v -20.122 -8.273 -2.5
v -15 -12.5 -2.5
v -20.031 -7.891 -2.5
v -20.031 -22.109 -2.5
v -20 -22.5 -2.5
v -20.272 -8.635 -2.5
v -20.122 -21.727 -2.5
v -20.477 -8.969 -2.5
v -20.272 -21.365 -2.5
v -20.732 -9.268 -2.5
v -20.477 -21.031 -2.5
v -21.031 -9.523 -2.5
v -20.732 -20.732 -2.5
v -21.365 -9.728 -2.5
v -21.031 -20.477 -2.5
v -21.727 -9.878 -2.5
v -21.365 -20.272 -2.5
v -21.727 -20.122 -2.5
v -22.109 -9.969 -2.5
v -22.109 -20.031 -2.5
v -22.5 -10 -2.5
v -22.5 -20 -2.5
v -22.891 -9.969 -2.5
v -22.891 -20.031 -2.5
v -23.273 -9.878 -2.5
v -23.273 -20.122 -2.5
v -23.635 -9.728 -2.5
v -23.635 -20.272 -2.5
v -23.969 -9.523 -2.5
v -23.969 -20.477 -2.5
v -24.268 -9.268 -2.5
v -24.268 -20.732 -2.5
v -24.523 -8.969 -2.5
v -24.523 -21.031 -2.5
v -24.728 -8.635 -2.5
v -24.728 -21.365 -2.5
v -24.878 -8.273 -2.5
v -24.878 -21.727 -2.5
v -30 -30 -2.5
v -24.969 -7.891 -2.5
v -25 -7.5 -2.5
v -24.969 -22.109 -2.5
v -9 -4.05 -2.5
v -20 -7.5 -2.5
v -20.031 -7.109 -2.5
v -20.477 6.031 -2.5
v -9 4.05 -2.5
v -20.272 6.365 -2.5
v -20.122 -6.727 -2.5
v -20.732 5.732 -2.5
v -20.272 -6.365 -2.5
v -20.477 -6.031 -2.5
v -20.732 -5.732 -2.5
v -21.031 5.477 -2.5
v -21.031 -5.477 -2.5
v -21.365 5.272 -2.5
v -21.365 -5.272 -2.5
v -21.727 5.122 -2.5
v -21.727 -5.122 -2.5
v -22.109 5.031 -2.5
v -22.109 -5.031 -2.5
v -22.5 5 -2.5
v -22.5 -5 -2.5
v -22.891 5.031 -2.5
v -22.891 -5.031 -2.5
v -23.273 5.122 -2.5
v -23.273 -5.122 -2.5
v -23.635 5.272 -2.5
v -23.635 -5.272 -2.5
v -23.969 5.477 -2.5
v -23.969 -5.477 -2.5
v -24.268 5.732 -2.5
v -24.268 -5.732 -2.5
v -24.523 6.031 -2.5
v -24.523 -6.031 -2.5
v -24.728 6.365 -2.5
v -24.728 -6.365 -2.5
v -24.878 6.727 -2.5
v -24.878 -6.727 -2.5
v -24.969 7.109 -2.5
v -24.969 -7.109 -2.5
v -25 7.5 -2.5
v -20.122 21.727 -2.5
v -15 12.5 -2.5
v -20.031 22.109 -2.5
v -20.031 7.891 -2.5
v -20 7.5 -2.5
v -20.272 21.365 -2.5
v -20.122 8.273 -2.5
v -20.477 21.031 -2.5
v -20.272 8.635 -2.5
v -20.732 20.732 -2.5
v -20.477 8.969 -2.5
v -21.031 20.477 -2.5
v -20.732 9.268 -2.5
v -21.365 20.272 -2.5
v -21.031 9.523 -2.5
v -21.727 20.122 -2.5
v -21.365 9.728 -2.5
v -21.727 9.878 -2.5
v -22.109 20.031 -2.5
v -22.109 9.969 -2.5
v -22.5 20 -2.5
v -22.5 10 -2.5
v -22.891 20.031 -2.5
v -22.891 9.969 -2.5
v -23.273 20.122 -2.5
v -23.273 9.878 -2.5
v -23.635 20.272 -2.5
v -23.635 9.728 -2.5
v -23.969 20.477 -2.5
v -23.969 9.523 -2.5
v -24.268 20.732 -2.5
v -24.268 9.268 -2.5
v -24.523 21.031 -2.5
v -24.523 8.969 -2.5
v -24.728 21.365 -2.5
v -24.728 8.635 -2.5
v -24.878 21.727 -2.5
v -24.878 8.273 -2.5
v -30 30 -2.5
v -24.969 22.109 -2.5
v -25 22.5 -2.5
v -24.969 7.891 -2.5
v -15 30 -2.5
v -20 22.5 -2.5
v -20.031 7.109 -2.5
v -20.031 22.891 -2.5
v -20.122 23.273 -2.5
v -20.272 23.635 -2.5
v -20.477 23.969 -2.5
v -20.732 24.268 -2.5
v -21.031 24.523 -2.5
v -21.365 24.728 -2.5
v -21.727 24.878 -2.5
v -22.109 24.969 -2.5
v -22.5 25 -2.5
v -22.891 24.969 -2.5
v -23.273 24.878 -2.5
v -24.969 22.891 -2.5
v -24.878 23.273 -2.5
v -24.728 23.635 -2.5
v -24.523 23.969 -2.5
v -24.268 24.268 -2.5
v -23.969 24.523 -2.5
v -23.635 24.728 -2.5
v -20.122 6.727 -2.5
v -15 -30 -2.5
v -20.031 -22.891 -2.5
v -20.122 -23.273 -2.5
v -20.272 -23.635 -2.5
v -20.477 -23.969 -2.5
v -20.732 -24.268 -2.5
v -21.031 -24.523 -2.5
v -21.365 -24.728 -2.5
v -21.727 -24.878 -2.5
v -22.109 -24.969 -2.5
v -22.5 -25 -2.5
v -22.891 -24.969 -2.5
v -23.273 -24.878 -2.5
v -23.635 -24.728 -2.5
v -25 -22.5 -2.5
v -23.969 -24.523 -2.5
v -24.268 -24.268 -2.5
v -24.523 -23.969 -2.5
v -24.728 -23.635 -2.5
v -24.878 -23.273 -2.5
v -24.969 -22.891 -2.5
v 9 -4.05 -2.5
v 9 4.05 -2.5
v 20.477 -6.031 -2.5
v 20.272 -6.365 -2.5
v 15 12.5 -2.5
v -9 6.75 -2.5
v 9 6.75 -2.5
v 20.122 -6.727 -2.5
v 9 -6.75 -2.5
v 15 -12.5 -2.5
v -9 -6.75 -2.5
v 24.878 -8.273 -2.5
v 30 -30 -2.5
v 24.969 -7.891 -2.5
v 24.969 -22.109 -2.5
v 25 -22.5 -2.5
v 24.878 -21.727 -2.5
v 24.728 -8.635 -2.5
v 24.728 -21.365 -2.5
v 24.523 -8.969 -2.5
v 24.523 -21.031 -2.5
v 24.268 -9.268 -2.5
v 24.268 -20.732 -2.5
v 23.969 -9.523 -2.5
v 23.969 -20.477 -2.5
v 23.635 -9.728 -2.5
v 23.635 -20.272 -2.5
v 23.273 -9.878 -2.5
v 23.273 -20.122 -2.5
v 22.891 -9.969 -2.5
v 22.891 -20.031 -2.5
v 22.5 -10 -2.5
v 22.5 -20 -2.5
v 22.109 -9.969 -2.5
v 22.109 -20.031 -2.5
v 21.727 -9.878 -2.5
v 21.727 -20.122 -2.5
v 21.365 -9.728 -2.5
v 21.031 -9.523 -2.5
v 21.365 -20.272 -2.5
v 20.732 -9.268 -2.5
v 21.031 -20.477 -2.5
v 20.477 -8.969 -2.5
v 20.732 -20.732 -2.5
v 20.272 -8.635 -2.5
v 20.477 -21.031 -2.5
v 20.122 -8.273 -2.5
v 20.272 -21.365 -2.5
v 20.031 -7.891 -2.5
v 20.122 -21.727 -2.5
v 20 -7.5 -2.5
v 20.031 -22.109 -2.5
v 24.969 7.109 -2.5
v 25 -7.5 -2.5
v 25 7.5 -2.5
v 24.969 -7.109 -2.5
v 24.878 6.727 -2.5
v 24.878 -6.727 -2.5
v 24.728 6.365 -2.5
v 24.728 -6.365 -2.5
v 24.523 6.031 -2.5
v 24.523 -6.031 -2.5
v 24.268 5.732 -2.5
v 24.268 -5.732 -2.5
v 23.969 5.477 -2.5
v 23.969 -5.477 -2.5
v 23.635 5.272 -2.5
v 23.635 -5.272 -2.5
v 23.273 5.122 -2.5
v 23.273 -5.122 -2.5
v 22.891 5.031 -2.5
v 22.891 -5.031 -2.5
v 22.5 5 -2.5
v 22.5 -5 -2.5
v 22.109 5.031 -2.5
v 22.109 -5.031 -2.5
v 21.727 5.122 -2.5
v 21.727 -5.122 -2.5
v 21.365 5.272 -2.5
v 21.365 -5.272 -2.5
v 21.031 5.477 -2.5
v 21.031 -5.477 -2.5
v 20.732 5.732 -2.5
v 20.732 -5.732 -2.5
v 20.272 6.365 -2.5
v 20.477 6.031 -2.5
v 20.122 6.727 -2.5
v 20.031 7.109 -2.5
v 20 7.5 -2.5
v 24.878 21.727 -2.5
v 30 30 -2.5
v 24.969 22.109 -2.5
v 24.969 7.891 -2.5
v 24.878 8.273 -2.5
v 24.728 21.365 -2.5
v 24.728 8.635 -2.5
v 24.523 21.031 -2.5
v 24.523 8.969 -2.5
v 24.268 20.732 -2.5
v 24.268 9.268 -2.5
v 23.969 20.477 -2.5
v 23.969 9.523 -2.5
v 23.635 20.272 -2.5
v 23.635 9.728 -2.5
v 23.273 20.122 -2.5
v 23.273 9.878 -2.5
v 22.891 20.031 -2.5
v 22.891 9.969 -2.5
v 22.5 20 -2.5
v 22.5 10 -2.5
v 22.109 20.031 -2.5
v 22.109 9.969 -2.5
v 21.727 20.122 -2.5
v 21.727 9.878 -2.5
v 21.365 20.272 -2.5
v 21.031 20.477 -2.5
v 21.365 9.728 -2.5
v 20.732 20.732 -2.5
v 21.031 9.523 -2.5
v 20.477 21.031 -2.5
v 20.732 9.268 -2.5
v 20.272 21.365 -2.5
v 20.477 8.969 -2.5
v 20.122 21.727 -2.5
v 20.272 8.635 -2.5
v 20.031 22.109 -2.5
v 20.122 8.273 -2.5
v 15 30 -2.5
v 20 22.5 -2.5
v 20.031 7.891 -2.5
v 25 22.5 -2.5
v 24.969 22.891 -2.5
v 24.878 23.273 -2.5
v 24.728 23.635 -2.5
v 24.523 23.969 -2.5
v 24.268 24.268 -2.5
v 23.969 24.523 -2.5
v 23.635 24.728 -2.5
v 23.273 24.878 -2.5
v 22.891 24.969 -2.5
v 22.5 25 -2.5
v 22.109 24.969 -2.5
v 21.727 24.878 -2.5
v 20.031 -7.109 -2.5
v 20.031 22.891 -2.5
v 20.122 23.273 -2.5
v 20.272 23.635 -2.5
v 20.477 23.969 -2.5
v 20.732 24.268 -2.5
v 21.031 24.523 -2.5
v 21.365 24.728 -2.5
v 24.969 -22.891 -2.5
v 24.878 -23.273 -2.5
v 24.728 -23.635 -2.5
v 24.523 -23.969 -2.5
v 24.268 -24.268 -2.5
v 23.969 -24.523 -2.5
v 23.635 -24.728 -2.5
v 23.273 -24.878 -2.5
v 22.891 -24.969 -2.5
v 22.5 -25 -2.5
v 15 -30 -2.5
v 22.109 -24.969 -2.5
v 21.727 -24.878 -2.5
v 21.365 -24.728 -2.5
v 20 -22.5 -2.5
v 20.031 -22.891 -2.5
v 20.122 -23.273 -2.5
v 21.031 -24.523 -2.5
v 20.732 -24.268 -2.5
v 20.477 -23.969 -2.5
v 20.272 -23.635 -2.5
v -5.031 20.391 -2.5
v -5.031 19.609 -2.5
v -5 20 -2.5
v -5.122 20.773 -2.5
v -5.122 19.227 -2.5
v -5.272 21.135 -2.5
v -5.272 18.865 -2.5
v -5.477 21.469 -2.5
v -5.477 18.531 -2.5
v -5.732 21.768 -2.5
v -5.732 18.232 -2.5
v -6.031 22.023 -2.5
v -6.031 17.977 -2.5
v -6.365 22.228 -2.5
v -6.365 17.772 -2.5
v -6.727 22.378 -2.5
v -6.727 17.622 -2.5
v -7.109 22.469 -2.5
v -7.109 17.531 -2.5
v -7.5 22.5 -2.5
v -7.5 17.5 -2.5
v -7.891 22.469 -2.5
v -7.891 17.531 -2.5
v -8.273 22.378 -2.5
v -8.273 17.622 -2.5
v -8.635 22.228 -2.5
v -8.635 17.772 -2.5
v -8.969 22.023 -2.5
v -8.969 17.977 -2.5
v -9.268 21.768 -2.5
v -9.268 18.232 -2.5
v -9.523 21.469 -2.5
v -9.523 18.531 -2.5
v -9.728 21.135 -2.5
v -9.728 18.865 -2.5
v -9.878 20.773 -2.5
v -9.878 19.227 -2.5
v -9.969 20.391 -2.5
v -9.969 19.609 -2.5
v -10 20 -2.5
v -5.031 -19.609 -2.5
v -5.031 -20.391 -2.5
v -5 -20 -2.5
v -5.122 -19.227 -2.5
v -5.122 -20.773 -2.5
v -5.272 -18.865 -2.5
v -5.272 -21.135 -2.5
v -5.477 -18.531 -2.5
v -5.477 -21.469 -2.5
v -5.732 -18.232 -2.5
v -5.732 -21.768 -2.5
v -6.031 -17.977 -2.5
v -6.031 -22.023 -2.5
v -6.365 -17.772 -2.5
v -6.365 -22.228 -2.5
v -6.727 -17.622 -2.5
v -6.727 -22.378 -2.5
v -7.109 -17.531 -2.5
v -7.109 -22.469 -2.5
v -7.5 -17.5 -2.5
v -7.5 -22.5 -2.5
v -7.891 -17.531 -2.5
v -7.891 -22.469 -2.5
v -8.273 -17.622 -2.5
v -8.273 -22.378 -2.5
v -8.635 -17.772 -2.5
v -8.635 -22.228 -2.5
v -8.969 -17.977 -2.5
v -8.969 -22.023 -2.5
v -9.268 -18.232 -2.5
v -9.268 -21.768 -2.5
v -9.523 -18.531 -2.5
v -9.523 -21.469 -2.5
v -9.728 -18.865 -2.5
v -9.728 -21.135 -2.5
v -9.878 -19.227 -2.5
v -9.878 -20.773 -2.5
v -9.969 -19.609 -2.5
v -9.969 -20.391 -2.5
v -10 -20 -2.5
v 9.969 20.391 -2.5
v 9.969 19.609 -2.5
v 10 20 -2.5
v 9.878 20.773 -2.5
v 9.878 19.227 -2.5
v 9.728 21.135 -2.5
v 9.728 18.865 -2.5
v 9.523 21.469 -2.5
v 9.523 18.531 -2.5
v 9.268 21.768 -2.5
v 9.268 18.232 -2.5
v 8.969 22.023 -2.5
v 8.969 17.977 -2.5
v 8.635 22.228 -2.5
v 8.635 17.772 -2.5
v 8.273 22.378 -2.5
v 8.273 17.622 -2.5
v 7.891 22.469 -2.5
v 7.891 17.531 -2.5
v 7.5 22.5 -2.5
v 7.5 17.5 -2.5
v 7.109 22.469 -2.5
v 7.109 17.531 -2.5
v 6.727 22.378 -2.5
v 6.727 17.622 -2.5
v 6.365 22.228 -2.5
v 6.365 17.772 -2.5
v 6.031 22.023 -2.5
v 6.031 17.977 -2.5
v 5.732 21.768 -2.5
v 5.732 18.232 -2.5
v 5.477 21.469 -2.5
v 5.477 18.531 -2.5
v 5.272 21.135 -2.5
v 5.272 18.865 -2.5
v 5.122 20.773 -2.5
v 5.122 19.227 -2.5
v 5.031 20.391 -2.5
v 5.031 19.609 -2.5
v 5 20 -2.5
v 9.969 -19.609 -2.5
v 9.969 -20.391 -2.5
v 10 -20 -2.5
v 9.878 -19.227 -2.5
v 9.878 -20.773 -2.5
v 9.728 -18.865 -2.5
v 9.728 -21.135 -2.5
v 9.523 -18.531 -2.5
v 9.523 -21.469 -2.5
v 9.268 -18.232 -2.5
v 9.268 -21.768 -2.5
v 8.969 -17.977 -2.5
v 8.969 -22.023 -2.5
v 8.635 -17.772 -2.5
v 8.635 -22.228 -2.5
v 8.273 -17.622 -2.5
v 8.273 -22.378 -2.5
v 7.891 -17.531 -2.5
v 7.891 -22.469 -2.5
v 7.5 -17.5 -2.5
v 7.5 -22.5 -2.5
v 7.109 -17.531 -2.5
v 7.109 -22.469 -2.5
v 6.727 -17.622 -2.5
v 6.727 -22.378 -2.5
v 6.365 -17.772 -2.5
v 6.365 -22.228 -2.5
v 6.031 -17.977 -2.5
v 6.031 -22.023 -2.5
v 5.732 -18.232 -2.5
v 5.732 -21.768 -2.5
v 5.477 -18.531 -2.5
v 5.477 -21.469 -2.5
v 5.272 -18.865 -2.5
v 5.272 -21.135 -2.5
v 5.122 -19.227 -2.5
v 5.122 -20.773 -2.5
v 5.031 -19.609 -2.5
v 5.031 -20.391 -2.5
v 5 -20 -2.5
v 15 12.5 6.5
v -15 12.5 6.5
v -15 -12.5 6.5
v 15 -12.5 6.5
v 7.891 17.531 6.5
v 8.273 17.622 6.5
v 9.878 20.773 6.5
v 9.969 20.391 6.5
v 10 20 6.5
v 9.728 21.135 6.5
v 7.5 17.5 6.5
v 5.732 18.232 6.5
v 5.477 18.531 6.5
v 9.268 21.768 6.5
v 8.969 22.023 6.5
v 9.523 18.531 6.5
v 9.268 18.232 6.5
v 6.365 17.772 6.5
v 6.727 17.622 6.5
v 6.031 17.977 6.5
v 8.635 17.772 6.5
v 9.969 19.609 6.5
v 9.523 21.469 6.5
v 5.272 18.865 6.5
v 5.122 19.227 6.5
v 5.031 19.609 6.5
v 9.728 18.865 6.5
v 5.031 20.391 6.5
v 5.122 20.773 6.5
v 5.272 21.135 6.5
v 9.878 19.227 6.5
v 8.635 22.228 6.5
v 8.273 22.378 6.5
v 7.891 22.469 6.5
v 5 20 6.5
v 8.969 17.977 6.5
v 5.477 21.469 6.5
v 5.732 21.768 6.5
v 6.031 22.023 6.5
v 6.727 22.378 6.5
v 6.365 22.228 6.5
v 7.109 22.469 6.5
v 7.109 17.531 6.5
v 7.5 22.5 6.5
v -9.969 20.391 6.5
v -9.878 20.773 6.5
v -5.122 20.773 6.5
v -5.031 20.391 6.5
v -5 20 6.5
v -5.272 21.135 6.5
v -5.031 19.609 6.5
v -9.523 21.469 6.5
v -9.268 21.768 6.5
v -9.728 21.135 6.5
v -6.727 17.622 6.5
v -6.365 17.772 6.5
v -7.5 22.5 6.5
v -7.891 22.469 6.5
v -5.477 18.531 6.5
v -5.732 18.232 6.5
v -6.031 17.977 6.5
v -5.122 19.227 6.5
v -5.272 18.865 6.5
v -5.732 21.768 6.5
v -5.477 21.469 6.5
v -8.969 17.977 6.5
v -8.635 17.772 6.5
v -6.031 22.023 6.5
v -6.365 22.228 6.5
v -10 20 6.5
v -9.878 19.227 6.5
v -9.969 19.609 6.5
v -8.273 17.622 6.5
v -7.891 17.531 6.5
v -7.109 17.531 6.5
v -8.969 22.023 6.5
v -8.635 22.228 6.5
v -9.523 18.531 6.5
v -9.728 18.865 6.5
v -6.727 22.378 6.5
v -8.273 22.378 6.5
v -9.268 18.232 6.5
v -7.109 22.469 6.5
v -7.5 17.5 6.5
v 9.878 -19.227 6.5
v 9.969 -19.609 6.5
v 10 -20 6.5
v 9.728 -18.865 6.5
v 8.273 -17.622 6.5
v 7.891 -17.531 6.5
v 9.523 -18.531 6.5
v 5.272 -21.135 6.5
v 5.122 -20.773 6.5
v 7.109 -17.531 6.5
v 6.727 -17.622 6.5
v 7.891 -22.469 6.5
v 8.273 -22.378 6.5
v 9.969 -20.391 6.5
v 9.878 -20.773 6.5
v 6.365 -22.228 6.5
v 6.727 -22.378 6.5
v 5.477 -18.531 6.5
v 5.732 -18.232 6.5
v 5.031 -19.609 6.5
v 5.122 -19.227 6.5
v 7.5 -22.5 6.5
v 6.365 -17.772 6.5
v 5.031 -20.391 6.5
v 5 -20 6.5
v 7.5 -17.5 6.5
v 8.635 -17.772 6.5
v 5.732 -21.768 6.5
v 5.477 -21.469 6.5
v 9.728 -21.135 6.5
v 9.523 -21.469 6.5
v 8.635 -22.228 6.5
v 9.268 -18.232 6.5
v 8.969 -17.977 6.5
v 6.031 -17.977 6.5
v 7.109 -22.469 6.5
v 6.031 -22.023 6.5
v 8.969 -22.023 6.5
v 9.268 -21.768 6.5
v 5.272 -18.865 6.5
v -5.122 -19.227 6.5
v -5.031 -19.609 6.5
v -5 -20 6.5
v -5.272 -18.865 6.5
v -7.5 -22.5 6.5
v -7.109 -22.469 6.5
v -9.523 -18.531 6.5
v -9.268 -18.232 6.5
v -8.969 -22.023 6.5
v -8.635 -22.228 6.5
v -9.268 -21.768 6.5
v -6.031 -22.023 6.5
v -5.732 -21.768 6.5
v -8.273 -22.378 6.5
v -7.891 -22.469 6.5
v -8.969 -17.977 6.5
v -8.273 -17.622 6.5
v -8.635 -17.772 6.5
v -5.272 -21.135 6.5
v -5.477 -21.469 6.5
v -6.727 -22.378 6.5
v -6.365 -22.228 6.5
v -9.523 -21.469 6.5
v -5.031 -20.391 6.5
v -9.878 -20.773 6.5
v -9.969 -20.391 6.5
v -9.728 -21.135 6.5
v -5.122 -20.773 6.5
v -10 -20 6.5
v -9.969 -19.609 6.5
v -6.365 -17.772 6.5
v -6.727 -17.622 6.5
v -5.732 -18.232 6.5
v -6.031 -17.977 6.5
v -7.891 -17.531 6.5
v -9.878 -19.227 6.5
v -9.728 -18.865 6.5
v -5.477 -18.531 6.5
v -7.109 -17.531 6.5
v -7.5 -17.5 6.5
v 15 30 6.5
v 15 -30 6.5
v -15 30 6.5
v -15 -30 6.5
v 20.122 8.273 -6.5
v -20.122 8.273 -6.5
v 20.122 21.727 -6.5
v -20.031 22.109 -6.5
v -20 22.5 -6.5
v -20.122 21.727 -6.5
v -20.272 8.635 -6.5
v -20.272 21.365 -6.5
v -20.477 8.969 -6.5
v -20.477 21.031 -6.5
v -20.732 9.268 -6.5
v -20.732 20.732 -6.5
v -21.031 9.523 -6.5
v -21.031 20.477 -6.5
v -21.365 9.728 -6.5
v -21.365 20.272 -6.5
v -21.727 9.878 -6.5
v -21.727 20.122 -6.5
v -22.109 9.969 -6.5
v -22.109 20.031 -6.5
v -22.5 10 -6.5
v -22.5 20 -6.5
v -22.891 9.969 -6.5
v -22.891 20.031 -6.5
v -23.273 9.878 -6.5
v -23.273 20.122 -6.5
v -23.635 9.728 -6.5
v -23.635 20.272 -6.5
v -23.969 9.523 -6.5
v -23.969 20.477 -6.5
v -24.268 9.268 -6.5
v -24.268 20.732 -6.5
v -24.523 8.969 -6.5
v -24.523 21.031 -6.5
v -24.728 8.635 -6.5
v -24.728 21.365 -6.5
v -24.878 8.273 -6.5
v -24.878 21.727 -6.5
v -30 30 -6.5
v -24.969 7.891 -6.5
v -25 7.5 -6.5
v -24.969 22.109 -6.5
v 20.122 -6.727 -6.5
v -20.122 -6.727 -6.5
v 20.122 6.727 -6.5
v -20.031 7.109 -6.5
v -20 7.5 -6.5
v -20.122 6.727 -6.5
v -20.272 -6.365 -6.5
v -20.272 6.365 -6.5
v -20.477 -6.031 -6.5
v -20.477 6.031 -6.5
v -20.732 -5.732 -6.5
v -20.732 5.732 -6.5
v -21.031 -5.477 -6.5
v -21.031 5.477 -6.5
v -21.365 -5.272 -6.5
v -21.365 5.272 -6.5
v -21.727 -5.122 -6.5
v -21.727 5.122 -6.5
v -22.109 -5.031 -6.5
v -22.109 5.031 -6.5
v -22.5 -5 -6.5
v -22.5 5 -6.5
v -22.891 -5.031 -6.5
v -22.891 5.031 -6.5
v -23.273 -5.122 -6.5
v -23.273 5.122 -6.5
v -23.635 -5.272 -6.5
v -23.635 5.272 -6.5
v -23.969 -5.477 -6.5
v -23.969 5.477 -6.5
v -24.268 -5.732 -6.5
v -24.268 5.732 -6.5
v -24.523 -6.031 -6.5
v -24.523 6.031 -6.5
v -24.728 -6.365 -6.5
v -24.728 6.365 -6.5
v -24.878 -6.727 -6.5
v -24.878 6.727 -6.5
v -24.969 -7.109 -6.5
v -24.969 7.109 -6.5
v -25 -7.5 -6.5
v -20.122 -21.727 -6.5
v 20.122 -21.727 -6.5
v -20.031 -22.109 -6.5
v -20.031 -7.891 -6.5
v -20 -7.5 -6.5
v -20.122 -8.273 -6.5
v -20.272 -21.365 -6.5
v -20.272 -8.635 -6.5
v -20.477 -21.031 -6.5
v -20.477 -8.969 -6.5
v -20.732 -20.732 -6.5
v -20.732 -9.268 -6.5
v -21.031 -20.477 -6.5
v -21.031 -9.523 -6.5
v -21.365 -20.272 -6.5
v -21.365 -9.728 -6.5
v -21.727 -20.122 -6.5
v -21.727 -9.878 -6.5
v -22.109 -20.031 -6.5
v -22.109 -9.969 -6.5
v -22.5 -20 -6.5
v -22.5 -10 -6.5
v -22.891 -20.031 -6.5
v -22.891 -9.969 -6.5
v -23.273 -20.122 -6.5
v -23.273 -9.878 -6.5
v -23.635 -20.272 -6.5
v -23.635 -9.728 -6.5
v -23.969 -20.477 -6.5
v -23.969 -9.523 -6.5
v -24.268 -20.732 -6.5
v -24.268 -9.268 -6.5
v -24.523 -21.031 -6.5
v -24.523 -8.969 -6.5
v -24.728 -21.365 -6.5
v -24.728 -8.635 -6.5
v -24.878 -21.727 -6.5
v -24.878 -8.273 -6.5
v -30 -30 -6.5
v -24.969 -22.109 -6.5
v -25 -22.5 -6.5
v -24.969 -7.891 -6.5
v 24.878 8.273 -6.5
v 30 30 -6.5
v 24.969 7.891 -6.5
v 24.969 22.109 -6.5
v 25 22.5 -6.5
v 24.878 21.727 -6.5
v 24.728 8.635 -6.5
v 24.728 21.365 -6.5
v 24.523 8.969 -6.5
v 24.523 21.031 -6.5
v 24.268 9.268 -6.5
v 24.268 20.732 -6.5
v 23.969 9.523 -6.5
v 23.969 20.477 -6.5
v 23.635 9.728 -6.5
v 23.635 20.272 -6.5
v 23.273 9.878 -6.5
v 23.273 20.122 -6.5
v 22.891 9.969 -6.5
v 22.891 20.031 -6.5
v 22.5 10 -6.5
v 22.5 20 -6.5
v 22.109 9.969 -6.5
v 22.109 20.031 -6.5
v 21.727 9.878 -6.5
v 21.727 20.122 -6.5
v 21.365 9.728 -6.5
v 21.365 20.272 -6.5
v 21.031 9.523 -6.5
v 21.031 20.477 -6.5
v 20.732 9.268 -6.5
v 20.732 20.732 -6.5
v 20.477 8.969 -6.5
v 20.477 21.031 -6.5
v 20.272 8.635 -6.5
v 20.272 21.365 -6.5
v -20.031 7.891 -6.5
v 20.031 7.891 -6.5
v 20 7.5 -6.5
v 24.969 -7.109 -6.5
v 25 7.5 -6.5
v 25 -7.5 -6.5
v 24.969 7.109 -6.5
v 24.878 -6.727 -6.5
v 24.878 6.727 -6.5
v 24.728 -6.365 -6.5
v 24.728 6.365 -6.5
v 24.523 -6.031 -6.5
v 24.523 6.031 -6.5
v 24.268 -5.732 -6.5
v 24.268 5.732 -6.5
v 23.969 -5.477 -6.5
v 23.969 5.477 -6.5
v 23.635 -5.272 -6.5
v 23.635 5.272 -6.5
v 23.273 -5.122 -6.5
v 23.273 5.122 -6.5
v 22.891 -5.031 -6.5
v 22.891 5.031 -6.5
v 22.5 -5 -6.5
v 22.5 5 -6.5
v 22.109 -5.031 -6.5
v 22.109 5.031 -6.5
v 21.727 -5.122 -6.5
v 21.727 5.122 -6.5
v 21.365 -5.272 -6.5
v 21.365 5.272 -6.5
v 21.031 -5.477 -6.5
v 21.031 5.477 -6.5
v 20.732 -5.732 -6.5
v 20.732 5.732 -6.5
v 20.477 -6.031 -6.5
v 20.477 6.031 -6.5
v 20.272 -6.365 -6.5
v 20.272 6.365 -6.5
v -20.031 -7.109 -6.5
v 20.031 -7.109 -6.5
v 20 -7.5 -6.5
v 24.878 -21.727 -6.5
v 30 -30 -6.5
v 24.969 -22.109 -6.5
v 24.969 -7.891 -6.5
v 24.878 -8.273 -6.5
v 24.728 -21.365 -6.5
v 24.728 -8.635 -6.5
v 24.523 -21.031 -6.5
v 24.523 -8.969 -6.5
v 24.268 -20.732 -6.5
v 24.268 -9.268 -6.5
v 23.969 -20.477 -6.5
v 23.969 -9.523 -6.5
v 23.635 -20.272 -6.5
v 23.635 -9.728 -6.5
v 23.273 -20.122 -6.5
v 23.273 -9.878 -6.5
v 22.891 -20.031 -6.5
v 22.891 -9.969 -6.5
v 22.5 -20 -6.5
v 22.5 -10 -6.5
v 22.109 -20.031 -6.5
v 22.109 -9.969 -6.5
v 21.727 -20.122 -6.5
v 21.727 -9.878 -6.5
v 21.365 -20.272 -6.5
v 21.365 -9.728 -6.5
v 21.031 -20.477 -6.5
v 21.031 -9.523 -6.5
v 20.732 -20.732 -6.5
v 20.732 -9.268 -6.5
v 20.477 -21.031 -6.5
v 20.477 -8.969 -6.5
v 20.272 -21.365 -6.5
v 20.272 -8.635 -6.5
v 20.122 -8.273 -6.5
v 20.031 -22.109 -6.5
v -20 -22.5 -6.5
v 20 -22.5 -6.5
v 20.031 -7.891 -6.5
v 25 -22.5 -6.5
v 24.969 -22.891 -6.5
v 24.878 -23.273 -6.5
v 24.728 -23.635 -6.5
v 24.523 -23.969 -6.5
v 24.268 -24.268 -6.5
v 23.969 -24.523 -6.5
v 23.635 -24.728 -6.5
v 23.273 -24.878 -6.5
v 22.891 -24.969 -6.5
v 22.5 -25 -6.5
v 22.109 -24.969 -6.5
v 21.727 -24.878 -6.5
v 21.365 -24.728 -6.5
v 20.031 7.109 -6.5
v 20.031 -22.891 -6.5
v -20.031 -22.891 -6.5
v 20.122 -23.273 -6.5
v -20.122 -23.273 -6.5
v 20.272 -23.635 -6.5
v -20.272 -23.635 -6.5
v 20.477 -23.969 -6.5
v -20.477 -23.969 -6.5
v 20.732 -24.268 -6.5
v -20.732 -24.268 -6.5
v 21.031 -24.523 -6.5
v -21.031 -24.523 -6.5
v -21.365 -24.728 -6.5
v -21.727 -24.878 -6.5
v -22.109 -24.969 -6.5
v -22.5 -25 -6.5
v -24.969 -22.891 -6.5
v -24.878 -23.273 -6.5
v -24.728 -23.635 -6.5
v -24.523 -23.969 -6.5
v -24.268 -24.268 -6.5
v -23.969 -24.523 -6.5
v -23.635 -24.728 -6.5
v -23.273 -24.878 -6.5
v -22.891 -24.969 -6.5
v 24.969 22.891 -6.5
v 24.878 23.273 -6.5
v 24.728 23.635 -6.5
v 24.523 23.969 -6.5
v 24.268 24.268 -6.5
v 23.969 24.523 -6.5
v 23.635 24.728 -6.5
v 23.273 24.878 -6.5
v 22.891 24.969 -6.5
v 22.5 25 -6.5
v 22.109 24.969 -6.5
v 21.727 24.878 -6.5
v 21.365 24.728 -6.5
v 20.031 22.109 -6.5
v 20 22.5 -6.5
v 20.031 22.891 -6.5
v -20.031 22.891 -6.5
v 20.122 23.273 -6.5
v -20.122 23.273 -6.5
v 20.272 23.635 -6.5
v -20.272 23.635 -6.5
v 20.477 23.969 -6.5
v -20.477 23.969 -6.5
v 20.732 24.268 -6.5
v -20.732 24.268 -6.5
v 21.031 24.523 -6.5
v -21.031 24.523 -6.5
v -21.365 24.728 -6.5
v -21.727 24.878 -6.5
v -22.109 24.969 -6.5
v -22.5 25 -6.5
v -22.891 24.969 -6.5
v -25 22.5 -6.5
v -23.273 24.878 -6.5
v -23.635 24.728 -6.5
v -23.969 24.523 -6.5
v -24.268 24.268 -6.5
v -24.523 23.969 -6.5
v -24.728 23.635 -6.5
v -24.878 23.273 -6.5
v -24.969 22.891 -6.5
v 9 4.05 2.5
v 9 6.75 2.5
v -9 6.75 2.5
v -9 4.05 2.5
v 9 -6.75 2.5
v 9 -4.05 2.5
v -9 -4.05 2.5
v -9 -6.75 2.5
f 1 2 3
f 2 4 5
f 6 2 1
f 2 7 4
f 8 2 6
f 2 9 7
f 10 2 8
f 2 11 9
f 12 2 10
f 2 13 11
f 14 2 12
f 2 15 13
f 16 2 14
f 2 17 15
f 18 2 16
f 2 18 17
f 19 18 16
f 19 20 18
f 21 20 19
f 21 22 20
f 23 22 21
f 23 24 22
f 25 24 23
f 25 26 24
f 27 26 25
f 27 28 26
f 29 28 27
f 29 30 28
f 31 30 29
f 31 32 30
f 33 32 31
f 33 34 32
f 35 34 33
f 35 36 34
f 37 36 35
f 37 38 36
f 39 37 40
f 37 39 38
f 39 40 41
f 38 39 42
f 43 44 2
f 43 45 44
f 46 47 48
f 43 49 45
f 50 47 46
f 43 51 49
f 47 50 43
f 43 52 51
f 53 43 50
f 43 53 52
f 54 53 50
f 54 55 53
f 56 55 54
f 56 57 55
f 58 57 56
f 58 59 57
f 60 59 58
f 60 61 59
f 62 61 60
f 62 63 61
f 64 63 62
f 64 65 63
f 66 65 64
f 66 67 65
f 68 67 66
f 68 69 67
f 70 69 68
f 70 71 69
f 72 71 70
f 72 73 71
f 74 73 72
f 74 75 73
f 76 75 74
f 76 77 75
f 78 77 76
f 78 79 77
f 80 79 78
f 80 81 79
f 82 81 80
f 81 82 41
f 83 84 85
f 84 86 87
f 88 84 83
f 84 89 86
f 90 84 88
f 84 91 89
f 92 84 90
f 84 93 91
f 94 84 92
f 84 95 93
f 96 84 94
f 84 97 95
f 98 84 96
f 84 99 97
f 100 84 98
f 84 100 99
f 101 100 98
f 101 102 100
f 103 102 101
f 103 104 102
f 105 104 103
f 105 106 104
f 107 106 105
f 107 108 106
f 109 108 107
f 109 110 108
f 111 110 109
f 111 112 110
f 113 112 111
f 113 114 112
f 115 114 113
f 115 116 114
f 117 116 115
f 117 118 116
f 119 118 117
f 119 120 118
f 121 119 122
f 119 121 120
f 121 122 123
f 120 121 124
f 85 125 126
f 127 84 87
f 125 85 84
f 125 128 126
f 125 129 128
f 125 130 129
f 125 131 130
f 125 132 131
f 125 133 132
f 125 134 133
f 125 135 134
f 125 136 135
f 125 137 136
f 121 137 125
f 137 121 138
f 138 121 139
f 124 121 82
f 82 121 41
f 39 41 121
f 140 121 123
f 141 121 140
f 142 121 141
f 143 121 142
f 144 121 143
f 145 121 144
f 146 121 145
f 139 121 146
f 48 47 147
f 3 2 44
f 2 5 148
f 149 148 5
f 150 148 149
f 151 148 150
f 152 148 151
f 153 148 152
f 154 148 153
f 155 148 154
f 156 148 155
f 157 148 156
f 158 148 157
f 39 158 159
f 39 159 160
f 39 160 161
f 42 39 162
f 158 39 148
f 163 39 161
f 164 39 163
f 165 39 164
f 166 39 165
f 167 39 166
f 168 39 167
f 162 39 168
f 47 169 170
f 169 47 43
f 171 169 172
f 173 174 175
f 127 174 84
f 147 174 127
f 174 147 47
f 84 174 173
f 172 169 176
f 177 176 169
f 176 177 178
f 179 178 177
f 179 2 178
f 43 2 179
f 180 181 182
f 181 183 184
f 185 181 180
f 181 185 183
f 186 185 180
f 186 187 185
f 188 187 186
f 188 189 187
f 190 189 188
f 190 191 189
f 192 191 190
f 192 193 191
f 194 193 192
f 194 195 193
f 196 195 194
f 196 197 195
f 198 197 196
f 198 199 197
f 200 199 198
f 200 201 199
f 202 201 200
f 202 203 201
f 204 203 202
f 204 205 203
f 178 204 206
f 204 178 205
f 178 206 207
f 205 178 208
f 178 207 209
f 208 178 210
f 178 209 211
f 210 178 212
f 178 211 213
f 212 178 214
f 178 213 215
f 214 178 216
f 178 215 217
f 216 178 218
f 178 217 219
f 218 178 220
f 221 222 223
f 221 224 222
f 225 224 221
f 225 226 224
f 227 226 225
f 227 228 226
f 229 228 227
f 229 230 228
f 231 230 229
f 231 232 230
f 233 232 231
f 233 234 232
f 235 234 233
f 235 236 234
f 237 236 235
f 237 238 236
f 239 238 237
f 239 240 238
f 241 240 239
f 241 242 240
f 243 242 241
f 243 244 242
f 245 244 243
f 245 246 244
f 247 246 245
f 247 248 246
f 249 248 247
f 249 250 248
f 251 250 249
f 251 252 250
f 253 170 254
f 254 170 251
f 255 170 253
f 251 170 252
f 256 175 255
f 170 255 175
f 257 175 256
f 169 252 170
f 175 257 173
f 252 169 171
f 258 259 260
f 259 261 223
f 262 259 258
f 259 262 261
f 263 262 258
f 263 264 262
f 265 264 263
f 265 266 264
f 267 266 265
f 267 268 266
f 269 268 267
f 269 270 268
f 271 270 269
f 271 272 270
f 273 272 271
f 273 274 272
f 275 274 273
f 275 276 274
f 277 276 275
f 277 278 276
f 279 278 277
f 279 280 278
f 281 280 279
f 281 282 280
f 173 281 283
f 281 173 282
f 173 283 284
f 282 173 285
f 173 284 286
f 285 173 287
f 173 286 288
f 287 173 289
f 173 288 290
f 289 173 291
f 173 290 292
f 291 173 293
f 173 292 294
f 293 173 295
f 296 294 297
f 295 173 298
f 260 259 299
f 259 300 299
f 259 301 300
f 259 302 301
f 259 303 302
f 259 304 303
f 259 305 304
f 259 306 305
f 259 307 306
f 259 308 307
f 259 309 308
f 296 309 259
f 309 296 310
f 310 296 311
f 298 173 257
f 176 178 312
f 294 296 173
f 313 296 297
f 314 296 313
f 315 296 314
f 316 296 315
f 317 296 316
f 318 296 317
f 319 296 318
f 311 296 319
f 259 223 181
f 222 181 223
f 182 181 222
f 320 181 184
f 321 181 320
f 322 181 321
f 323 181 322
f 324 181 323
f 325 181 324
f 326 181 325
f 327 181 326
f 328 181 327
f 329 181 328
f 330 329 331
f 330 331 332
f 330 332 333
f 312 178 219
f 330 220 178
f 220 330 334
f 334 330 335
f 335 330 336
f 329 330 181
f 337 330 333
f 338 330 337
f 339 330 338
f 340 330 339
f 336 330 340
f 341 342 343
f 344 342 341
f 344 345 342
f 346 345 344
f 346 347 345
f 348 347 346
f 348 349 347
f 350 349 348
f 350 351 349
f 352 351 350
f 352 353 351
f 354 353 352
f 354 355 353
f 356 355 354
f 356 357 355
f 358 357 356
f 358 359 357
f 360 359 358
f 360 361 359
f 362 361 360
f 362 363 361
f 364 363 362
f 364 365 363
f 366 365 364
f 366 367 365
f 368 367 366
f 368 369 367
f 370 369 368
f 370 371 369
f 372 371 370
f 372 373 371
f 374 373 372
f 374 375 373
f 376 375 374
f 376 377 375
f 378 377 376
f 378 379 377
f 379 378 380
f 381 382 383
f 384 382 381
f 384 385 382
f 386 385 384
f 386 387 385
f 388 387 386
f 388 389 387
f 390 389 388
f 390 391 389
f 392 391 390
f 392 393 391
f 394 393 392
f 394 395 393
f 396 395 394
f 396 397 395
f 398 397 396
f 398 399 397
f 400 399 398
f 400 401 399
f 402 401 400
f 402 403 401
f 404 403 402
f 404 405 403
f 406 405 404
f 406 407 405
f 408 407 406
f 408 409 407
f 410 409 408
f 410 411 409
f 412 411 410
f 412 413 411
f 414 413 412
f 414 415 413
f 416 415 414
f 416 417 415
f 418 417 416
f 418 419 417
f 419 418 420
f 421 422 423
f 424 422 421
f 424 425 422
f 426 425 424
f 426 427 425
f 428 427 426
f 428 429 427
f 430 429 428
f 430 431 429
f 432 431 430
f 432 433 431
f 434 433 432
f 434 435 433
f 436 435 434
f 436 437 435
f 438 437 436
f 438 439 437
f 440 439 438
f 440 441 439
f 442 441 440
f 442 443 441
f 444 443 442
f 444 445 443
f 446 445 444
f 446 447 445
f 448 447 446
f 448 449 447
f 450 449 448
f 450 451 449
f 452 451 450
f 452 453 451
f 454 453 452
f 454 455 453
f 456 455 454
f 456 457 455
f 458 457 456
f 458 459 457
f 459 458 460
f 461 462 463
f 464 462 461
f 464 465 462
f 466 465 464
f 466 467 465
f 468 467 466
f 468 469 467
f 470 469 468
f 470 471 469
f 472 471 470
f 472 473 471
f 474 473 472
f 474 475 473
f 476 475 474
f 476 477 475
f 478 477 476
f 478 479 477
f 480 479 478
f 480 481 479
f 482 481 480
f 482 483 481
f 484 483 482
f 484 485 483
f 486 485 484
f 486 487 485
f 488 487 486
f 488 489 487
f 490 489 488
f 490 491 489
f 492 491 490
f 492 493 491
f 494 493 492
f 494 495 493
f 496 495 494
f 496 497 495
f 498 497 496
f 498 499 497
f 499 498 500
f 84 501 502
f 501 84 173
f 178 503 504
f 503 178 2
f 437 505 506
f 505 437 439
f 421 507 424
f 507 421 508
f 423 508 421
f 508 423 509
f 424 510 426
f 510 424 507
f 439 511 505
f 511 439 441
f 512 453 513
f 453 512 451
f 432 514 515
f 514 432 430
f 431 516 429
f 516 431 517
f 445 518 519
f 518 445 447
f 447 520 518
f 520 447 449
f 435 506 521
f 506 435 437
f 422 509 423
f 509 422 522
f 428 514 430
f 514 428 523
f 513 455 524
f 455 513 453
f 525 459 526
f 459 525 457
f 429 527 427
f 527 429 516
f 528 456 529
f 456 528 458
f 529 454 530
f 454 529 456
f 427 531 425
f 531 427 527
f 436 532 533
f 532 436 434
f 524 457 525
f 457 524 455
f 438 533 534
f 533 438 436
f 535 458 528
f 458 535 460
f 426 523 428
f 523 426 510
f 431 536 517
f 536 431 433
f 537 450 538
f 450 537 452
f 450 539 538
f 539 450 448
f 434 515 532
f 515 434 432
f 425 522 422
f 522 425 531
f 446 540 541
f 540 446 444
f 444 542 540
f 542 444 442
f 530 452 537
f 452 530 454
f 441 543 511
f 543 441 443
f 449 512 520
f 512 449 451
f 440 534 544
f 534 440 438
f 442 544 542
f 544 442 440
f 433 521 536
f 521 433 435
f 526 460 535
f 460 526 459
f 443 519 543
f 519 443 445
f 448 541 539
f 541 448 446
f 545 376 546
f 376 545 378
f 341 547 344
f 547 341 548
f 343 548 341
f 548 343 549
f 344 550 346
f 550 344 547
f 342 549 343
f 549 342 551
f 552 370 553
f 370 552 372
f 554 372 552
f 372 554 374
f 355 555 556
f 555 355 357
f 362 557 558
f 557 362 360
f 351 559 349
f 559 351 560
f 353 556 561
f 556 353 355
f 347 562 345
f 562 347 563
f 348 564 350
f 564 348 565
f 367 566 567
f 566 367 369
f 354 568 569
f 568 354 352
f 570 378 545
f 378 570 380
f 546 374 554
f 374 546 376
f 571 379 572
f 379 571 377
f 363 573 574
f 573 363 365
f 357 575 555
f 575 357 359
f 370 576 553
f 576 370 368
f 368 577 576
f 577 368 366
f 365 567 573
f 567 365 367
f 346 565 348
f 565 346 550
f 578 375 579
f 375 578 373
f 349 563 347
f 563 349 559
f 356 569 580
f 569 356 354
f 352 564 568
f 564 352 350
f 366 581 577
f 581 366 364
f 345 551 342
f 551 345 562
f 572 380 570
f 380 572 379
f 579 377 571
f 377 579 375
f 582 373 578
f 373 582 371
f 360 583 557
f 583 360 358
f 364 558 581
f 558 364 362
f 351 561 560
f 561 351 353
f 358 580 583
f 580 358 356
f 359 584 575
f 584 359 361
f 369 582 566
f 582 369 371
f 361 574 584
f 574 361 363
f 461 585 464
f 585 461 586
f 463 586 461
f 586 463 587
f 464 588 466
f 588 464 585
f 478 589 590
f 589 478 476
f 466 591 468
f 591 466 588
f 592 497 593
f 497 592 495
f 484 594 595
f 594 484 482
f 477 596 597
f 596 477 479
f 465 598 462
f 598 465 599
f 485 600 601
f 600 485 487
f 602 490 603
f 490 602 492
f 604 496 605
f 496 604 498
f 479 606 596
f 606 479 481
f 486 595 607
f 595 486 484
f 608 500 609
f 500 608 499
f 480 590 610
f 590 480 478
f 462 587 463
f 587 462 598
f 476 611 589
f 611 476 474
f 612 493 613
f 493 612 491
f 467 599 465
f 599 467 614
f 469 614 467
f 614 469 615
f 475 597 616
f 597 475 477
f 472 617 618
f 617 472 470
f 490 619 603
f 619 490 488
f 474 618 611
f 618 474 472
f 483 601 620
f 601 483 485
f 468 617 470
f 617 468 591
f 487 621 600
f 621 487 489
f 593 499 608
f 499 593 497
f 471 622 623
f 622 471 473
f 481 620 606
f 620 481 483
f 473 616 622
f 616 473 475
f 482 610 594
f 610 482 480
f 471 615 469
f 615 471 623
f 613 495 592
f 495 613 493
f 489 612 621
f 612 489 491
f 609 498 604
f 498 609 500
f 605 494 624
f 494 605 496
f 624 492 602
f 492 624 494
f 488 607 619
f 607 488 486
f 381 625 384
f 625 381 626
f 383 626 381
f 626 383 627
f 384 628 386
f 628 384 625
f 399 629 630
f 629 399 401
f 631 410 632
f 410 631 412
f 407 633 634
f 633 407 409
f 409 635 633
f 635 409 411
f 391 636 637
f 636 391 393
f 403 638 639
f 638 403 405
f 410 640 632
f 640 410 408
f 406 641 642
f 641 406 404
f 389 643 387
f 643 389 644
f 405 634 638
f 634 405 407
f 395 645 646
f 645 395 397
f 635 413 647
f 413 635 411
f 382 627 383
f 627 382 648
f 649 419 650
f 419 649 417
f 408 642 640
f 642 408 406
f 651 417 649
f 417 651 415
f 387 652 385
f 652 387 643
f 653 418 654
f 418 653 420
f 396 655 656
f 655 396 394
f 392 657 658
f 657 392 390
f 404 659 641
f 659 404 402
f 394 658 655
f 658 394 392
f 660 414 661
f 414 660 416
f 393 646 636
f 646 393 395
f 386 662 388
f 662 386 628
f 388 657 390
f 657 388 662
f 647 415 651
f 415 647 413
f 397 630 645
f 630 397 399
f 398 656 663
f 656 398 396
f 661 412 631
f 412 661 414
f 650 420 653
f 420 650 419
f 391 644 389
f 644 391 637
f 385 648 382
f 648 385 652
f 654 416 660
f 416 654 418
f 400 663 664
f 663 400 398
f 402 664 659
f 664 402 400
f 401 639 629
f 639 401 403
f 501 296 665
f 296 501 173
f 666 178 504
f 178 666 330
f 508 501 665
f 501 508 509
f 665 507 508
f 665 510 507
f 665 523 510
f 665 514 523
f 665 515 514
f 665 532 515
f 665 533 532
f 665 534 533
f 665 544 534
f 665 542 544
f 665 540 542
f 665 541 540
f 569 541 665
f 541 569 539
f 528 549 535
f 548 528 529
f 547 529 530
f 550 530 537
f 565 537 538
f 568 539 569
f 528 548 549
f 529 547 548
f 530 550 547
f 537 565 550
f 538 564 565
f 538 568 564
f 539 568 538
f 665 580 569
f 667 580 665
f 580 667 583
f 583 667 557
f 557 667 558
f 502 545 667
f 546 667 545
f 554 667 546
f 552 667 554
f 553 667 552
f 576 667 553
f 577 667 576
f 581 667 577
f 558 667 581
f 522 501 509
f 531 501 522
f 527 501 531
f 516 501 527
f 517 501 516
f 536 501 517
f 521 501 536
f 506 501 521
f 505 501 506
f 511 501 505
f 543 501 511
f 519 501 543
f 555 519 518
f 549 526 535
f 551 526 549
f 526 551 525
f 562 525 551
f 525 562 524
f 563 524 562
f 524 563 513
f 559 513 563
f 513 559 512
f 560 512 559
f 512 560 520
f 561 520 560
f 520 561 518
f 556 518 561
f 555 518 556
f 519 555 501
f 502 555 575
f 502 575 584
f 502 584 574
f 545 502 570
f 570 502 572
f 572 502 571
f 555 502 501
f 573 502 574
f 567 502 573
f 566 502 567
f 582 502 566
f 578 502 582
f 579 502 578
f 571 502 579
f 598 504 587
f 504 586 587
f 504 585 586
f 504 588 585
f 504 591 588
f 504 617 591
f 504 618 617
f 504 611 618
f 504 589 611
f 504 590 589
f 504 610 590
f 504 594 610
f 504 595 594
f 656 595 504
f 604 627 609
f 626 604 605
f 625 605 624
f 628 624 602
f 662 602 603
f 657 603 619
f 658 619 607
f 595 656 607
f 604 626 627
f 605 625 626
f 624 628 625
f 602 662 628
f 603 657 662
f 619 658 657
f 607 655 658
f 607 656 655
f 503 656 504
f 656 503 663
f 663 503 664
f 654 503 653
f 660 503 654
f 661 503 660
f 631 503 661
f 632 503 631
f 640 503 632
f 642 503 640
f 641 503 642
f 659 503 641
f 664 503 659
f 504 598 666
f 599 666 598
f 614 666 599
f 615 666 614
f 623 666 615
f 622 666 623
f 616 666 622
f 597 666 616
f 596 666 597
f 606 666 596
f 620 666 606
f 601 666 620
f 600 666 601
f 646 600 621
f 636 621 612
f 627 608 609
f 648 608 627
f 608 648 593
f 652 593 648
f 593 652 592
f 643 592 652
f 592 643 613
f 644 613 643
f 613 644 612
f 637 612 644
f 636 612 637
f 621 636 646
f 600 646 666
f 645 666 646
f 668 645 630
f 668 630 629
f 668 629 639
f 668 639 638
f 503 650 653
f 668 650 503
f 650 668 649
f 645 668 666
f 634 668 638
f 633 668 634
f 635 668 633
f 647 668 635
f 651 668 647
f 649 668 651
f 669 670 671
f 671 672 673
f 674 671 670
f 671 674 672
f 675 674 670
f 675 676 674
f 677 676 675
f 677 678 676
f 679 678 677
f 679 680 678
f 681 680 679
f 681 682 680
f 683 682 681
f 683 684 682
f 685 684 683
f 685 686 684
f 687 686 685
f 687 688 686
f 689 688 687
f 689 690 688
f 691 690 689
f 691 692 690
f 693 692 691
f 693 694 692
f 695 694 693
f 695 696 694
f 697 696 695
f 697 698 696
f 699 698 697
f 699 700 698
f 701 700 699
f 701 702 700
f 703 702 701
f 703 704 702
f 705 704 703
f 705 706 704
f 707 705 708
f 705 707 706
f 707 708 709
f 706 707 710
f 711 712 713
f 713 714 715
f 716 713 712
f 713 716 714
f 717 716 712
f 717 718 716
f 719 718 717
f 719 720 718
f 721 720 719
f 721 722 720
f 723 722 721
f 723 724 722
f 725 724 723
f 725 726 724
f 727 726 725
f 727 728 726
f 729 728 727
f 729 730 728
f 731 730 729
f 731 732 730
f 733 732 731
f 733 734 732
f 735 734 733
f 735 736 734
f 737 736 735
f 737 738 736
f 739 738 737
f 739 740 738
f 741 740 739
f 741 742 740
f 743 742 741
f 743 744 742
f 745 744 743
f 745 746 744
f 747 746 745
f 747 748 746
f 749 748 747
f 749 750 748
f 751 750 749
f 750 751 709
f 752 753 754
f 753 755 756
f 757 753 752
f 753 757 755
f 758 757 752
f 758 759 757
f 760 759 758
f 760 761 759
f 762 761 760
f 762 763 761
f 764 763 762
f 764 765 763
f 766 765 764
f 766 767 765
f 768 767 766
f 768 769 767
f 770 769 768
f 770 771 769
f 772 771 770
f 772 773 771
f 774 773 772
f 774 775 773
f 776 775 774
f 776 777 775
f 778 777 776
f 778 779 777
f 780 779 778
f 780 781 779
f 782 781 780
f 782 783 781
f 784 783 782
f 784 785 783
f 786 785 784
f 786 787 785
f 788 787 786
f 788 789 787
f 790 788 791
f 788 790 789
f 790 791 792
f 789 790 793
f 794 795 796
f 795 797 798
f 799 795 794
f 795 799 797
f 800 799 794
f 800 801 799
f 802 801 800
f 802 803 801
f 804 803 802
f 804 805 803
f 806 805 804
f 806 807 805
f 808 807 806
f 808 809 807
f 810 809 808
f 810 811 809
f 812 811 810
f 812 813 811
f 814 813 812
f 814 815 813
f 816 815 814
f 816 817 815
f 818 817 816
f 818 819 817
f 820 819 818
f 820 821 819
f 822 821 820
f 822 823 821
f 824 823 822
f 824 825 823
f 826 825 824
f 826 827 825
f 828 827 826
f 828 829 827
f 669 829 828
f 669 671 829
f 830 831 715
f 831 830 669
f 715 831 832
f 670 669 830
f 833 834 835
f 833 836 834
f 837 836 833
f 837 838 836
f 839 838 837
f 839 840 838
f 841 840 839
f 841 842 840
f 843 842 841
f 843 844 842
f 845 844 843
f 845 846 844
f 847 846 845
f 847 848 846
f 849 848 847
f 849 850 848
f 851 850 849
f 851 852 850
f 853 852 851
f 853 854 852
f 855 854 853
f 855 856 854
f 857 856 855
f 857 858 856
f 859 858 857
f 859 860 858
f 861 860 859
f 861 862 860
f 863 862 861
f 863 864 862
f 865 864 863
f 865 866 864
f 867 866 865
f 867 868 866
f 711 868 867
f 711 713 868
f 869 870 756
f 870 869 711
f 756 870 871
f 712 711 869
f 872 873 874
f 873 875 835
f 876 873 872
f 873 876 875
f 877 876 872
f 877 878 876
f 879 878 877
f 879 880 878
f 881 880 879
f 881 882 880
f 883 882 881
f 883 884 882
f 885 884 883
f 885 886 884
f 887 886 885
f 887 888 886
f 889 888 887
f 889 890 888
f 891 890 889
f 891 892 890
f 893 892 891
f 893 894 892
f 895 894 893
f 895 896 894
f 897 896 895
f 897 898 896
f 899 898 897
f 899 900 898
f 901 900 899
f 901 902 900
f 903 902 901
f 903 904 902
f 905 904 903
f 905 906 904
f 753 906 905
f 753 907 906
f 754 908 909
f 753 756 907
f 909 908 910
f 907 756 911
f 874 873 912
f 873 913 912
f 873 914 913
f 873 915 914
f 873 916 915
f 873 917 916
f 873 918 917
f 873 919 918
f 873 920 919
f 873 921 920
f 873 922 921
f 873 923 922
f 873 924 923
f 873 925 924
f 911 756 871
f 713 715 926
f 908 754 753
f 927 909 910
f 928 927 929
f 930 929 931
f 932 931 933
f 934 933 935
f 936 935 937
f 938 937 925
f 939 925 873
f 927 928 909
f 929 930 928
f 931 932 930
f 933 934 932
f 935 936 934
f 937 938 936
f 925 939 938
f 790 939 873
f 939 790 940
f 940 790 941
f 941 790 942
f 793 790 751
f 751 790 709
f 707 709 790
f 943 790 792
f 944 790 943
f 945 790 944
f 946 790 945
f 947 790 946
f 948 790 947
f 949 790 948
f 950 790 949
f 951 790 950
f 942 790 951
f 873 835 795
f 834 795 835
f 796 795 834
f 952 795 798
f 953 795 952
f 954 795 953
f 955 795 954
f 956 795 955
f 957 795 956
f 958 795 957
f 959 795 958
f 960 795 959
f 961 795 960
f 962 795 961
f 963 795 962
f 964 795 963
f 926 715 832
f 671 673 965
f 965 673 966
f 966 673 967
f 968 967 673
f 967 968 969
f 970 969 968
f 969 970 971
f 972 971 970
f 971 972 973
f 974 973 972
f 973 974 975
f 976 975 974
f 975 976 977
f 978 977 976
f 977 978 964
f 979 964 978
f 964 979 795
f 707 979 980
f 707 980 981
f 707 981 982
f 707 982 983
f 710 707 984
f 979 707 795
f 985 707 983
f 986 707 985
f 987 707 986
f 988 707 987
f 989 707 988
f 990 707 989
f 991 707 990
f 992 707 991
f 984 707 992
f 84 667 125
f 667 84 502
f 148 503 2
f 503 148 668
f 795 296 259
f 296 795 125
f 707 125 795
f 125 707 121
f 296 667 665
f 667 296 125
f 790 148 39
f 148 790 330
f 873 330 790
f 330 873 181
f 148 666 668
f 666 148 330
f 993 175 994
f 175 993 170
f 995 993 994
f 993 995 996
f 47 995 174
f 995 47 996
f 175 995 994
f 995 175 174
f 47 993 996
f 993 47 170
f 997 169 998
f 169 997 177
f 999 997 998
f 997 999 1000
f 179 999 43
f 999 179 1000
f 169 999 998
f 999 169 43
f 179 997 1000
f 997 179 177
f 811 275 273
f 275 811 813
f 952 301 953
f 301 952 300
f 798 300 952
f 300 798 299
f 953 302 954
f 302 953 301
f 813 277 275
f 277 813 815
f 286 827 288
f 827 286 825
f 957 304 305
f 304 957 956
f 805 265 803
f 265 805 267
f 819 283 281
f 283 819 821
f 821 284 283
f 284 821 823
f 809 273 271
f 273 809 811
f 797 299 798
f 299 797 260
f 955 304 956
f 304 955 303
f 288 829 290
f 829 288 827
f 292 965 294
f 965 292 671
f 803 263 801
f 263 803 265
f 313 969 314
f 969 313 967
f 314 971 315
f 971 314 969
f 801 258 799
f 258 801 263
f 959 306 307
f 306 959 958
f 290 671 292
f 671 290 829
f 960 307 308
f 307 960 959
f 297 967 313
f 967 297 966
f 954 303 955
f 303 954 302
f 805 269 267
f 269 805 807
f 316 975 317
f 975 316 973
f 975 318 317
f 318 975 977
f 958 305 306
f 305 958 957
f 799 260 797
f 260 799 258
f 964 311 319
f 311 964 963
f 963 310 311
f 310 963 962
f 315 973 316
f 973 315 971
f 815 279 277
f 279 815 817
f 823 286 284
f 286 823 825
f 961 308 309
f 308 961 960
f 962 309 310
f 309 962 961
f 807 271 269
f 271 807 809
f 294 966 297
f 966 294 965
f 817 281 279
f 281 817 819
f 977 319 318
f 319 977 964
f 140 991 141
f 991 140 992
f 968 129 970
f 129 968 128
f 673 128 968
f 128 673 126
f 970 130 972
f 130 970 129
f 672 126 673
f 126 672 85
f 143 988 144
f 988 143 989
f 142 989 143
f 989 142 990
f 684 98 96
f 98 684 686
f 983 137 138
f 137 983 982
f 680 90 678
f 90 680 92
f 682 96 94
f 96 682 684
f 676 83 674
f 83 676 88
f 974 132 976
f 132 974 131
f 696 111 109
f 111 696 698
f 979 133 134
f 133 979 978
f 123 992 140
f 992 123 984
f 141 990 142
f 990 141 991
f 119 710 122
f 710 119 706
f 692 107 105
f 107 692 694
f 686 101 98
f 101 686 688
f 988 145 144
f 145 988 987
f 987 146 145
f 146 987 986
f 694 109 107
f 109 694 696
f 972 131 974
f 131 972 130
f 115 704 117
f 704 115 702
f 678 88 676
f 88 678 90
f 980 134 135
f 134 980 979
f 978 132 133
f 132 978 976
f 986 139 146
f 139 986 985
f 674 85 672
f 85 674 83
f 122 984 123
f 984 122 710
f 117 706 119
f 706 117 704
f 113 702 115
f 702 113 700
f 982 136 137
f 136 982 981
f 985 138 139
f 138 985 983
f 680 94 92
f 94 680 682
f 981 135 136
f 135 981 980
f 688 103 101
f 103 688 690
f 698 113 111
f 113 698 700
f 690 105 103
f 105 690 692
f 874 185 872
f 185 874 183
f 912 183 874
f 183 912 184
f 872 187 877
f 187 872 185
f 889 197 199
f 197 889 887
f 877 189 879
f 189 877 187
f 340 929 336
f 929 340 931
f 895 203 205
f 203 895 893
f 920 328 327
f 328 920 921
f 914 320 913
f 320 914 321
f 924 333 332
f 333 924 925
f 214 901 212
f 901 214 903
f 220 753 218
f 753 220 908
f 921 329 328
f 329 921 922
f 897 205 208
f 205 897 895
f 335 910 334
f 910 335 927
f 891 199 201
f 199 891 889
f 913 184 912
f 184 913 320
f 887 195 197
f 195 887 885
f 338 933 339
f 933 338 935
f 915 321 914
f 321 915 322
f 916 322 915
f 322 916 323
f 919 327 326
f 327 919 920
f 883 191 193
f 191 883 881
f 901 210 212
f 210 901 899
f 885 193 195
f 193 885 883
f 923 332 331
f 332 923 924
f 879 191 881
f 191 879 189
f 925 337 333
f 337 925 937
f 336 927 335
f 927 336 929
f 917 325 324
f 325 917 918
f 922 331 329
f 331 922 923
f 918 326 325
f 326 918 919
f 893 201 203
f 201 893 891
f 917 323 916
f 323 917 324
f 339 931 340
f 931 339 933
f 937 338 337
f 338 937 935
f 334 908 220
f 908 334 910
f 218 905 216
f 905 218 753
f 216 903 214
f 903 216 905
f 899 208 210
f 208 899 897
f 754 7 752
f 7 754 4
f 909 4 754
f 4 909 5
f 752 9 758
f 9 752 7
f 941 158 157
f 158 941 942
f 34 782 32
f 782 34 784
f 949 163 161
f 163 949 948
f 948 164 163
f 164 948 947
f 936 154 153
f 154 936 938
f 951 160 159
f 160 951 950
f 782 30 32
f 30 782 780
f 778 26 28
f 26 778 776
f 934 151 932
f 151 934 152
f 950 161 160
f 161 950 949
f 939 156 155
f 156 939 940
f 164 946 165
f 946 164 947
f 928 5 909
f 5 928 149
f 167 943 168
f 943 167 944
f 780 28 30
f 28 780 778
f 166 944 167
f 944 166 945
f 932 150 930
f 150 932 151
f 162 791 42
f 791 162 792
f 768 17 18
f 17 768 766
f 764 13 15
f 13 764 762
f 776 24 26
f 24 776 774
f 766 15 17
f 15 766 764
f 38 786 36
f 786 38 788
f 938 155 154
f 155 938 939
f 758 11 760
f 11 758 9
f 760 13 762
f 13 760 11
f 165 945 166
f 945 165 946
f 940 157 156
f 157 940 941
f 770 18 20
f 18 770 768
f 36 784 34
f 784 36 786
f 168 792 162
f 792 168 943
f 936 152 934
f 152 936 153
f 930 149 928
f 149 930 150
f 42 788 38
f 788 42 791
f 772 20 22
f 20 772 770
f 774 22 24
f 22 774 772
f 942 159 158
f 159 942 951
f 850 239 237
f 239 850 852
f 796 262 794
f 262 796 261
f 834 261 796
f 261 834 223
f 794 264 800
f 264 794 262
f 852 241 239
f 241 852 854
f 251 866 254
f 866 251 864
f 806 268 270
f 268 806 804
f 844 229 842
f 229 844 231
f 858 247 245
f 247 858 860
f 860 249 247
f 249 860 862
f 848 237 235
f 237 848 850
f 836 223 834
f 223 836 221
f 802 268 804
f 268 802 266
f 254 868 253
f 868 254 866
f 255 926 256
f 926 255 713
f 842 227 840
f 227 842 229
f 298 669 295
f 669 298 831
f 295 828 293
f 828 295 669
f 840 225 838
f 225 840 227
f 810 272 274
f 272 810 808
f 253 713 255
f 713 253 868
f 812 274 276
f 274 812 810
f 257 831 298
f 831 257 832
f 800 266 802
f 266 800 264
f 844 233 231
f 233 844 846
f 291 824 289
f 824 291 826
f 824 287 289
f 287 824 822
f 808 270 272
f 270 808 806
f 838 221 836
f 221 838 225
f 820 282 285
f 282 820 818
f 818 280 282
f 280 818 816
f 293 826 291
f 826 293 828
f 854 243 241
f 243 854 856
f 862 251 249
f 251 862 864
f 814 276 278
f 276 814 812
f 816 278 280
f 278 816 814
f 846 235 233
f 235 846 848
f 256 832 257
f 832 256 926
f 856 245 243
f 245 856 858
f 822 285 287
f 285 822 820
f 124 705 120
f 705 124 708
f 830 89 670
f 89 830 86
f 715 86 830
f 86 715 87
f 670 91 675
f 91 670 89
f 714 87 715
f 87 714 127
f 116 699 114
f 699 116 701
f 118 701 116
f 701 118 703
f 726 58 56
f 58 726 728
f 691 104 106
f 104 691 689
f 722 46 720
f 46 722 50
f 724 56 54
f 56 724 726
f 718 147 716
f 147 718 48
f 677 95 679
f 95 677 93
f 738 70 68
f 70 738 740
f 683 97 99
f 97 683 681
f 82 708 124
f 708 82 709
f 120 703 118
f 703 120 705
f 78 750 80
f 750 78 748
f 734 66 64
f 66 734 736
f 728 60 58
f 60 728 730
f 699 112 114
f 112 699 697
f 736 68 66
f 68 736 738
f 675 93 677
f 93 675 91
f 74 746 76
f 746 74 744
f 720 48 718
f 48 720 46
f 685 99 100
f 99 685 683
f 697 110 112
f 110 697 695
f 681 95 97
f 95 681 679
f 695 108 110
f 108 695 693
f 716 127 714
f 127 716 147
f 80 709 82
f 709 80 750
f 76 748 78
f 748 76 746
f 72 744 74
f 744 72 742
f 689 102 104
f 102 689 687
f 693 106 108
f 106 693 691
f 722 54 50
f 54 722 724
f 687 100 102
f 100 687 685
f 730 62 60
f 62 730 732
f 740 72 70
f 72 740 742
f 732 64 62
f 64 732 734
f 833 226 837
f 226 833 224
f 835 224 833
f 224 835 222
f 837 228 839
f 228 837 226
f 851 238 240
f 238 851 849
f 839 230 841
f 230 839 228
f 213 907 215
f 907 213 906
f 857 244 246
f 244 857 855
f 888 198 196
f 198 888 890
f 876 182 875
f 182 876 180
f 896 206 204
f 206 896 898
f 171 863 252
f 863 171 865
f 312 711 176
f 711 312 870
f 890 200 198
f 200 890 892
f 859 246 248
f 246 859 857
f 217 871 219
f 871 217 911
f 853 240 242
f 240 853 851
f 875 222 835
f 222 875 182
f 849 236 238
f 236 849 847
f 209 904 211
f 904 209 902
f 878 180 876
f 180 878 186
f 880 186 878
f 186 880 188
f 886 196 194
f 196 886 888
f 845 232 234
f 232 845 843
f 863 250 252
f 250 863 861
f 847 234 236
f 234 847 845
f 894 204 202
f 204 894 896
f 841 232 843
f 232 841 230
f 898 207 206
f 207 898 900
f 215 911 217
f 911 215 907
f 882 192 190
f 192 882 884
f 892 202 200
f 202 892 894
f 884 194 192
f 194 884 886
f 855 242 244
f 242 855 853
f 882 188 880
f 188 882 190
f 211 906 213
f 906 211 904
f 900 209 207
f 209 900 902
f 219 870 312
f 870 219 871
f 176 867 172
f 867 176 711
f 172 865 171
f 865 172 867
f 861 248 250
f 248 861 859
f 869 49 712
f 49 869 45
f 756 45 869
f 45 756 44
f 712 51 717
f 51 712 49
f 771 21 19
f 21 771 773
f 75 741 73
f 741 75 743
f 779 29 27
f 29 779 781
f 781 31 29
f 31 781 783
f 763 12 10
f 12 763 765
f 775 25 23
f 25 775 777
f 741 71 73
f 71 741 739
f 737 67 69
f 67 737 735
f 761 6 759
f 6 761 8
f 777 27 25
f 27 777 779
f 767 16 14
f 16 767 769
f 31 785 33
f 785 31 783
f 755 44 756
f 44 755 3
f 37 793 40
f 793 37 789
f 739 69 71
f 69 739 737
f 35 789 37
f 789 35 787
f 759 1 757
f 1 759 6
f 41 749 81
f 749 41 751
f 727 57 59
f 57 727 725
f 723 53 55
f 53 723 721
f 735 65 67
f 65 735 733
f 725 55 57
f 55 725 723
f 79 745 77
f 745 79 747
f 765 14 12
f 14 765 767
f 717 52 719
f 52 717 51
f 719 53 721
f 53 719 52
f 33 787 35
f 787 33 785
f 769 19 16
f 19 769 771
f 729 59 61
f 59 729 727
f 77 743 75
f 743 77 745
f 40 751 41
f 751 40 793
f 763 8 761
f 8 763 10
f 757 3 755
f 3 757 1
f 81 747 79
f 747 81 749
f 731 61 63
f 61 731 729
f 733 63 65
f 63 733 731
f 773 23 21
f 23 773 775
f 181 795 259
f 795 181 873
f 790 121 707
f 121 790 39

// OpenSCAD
// file: BaseTrackBlock.scad
// 

//number of facets
$fn=40;

//block shape
block_x=30;
block_y=60;
block_z=13;

// track channel
track_channel_x=block_x+10;
track_channel_y=25;
track_channel_z=13;

// block top
block_top_x=20;
block_top_y=block_y+10;
block_top_z=16.5;

// spacing of screw holes
block_screw_hole_x=7.5;
block_screw_hole_y=20;

module 5mm_screw_way()
{
    cylinder(d=5, h=50,  center=true);
}

module 5mm_screw_bevel()
{
    cylinder(d1=9.2, d2=5, h=2.5,  center=true);
}

module block_channel_cutout()
{
    cube([track_channel_x,track_channel_y,track_channel_z],center=true);
}

module top_block()
{
    difference()
    {
        union()
        {
            cube ([block_x,block_y,block_z],center=true);
        }
        union()
        {
        // Cut out for the channel
            translate([0,0,4]) block_channel_cutout();
        // Screw holes
            translate([block_screw_hole_x,block_screw_hole_y,0]) 5mm_screw_way();
            translate([-block_screw_hole_x,block_screw_hole_y,0]) 5mm_screw_way();
            translate([block_screw_hole_x,-block_screw_hole_y,0]) 5mm_screw_way();
            translate([-block_screw_hole_x,-block_screw_hole_y,0]) 5mm_screw_way();

        // Machine Screw Bevels ### Need to tinker with this to get bevel right depth and width
            translate([block_screw_hole_x,block_screw_hole_y,-5.26]) 5mm_screw_bevel();
            translate([-block_screw_hole_x,block_screw_hole_y,-5.26]) 5mm_screw_bevel();
            translate([block_screw_hole_x,-block_screw_hole_y,-5.26]) 5mm_screw_bevel();
            translate([-block_screw_hole_x,-block_screw_hole_y,-5.26]) 5mm_screw_bevel();
        }
    }
    
}

module track_tab()
{
    cube([18,2.7,5],center=true);
}

module BaseTrackBlock()
{
    union()
    {
        top_block();
        translate([0,5.4,0]) track_tab();
        translate([0,-5.4,0]) track_tab();
    }
}

BaseTrackBlock();
// main file
//

include <BaseTrackBlock.scad>

//number of facets
$fn=40;

//plate shape
plate_shape_x=60;
plate_shape_y=60;
plate_shape_z=4;

// spacing of screw holes
plate_screw_hole_x=7.5;
plate_screw_hole_y=22.5;

module plate_shape()
{
    difference()
    {
        union()
        {
        translate([0,0,-4.5]) cube ([plate_shape_x,plate_shape_y,plate_shape_z],center=true);
        }
        union()
        {
            translate([plate_screw_hole_y,plate_screw_hole_y,0]) 5mm_screw_way();
            translate([-plate_screw_hole_y,plate_screw_hole_y,0]) 5mm_screw_way();
            translate([plate_screw_hole_y,-plate_screw_hole_y,0]) 5mm_screw_way();
            translate([-plate_screw_hole_y,-plate_screw_hole_y,0]) 5mm_screw_way();
            translate([plate_screw_hole_y,plate_screw_hole_x,0]) 5mm_screw_way();
            translate([-plate_screw_hole_y,plate_screw_hole_x,0]) 5mm_screw_way();
            translate([plate_screw_hole_y,-plate_screw_hole_x,0]) 5mm_screw_way();
            translate([-plate_screw_hole_y,-plate_screw_hole_x,0]) 5mm_screw_way();
        }
    }
}

plate_shape();
